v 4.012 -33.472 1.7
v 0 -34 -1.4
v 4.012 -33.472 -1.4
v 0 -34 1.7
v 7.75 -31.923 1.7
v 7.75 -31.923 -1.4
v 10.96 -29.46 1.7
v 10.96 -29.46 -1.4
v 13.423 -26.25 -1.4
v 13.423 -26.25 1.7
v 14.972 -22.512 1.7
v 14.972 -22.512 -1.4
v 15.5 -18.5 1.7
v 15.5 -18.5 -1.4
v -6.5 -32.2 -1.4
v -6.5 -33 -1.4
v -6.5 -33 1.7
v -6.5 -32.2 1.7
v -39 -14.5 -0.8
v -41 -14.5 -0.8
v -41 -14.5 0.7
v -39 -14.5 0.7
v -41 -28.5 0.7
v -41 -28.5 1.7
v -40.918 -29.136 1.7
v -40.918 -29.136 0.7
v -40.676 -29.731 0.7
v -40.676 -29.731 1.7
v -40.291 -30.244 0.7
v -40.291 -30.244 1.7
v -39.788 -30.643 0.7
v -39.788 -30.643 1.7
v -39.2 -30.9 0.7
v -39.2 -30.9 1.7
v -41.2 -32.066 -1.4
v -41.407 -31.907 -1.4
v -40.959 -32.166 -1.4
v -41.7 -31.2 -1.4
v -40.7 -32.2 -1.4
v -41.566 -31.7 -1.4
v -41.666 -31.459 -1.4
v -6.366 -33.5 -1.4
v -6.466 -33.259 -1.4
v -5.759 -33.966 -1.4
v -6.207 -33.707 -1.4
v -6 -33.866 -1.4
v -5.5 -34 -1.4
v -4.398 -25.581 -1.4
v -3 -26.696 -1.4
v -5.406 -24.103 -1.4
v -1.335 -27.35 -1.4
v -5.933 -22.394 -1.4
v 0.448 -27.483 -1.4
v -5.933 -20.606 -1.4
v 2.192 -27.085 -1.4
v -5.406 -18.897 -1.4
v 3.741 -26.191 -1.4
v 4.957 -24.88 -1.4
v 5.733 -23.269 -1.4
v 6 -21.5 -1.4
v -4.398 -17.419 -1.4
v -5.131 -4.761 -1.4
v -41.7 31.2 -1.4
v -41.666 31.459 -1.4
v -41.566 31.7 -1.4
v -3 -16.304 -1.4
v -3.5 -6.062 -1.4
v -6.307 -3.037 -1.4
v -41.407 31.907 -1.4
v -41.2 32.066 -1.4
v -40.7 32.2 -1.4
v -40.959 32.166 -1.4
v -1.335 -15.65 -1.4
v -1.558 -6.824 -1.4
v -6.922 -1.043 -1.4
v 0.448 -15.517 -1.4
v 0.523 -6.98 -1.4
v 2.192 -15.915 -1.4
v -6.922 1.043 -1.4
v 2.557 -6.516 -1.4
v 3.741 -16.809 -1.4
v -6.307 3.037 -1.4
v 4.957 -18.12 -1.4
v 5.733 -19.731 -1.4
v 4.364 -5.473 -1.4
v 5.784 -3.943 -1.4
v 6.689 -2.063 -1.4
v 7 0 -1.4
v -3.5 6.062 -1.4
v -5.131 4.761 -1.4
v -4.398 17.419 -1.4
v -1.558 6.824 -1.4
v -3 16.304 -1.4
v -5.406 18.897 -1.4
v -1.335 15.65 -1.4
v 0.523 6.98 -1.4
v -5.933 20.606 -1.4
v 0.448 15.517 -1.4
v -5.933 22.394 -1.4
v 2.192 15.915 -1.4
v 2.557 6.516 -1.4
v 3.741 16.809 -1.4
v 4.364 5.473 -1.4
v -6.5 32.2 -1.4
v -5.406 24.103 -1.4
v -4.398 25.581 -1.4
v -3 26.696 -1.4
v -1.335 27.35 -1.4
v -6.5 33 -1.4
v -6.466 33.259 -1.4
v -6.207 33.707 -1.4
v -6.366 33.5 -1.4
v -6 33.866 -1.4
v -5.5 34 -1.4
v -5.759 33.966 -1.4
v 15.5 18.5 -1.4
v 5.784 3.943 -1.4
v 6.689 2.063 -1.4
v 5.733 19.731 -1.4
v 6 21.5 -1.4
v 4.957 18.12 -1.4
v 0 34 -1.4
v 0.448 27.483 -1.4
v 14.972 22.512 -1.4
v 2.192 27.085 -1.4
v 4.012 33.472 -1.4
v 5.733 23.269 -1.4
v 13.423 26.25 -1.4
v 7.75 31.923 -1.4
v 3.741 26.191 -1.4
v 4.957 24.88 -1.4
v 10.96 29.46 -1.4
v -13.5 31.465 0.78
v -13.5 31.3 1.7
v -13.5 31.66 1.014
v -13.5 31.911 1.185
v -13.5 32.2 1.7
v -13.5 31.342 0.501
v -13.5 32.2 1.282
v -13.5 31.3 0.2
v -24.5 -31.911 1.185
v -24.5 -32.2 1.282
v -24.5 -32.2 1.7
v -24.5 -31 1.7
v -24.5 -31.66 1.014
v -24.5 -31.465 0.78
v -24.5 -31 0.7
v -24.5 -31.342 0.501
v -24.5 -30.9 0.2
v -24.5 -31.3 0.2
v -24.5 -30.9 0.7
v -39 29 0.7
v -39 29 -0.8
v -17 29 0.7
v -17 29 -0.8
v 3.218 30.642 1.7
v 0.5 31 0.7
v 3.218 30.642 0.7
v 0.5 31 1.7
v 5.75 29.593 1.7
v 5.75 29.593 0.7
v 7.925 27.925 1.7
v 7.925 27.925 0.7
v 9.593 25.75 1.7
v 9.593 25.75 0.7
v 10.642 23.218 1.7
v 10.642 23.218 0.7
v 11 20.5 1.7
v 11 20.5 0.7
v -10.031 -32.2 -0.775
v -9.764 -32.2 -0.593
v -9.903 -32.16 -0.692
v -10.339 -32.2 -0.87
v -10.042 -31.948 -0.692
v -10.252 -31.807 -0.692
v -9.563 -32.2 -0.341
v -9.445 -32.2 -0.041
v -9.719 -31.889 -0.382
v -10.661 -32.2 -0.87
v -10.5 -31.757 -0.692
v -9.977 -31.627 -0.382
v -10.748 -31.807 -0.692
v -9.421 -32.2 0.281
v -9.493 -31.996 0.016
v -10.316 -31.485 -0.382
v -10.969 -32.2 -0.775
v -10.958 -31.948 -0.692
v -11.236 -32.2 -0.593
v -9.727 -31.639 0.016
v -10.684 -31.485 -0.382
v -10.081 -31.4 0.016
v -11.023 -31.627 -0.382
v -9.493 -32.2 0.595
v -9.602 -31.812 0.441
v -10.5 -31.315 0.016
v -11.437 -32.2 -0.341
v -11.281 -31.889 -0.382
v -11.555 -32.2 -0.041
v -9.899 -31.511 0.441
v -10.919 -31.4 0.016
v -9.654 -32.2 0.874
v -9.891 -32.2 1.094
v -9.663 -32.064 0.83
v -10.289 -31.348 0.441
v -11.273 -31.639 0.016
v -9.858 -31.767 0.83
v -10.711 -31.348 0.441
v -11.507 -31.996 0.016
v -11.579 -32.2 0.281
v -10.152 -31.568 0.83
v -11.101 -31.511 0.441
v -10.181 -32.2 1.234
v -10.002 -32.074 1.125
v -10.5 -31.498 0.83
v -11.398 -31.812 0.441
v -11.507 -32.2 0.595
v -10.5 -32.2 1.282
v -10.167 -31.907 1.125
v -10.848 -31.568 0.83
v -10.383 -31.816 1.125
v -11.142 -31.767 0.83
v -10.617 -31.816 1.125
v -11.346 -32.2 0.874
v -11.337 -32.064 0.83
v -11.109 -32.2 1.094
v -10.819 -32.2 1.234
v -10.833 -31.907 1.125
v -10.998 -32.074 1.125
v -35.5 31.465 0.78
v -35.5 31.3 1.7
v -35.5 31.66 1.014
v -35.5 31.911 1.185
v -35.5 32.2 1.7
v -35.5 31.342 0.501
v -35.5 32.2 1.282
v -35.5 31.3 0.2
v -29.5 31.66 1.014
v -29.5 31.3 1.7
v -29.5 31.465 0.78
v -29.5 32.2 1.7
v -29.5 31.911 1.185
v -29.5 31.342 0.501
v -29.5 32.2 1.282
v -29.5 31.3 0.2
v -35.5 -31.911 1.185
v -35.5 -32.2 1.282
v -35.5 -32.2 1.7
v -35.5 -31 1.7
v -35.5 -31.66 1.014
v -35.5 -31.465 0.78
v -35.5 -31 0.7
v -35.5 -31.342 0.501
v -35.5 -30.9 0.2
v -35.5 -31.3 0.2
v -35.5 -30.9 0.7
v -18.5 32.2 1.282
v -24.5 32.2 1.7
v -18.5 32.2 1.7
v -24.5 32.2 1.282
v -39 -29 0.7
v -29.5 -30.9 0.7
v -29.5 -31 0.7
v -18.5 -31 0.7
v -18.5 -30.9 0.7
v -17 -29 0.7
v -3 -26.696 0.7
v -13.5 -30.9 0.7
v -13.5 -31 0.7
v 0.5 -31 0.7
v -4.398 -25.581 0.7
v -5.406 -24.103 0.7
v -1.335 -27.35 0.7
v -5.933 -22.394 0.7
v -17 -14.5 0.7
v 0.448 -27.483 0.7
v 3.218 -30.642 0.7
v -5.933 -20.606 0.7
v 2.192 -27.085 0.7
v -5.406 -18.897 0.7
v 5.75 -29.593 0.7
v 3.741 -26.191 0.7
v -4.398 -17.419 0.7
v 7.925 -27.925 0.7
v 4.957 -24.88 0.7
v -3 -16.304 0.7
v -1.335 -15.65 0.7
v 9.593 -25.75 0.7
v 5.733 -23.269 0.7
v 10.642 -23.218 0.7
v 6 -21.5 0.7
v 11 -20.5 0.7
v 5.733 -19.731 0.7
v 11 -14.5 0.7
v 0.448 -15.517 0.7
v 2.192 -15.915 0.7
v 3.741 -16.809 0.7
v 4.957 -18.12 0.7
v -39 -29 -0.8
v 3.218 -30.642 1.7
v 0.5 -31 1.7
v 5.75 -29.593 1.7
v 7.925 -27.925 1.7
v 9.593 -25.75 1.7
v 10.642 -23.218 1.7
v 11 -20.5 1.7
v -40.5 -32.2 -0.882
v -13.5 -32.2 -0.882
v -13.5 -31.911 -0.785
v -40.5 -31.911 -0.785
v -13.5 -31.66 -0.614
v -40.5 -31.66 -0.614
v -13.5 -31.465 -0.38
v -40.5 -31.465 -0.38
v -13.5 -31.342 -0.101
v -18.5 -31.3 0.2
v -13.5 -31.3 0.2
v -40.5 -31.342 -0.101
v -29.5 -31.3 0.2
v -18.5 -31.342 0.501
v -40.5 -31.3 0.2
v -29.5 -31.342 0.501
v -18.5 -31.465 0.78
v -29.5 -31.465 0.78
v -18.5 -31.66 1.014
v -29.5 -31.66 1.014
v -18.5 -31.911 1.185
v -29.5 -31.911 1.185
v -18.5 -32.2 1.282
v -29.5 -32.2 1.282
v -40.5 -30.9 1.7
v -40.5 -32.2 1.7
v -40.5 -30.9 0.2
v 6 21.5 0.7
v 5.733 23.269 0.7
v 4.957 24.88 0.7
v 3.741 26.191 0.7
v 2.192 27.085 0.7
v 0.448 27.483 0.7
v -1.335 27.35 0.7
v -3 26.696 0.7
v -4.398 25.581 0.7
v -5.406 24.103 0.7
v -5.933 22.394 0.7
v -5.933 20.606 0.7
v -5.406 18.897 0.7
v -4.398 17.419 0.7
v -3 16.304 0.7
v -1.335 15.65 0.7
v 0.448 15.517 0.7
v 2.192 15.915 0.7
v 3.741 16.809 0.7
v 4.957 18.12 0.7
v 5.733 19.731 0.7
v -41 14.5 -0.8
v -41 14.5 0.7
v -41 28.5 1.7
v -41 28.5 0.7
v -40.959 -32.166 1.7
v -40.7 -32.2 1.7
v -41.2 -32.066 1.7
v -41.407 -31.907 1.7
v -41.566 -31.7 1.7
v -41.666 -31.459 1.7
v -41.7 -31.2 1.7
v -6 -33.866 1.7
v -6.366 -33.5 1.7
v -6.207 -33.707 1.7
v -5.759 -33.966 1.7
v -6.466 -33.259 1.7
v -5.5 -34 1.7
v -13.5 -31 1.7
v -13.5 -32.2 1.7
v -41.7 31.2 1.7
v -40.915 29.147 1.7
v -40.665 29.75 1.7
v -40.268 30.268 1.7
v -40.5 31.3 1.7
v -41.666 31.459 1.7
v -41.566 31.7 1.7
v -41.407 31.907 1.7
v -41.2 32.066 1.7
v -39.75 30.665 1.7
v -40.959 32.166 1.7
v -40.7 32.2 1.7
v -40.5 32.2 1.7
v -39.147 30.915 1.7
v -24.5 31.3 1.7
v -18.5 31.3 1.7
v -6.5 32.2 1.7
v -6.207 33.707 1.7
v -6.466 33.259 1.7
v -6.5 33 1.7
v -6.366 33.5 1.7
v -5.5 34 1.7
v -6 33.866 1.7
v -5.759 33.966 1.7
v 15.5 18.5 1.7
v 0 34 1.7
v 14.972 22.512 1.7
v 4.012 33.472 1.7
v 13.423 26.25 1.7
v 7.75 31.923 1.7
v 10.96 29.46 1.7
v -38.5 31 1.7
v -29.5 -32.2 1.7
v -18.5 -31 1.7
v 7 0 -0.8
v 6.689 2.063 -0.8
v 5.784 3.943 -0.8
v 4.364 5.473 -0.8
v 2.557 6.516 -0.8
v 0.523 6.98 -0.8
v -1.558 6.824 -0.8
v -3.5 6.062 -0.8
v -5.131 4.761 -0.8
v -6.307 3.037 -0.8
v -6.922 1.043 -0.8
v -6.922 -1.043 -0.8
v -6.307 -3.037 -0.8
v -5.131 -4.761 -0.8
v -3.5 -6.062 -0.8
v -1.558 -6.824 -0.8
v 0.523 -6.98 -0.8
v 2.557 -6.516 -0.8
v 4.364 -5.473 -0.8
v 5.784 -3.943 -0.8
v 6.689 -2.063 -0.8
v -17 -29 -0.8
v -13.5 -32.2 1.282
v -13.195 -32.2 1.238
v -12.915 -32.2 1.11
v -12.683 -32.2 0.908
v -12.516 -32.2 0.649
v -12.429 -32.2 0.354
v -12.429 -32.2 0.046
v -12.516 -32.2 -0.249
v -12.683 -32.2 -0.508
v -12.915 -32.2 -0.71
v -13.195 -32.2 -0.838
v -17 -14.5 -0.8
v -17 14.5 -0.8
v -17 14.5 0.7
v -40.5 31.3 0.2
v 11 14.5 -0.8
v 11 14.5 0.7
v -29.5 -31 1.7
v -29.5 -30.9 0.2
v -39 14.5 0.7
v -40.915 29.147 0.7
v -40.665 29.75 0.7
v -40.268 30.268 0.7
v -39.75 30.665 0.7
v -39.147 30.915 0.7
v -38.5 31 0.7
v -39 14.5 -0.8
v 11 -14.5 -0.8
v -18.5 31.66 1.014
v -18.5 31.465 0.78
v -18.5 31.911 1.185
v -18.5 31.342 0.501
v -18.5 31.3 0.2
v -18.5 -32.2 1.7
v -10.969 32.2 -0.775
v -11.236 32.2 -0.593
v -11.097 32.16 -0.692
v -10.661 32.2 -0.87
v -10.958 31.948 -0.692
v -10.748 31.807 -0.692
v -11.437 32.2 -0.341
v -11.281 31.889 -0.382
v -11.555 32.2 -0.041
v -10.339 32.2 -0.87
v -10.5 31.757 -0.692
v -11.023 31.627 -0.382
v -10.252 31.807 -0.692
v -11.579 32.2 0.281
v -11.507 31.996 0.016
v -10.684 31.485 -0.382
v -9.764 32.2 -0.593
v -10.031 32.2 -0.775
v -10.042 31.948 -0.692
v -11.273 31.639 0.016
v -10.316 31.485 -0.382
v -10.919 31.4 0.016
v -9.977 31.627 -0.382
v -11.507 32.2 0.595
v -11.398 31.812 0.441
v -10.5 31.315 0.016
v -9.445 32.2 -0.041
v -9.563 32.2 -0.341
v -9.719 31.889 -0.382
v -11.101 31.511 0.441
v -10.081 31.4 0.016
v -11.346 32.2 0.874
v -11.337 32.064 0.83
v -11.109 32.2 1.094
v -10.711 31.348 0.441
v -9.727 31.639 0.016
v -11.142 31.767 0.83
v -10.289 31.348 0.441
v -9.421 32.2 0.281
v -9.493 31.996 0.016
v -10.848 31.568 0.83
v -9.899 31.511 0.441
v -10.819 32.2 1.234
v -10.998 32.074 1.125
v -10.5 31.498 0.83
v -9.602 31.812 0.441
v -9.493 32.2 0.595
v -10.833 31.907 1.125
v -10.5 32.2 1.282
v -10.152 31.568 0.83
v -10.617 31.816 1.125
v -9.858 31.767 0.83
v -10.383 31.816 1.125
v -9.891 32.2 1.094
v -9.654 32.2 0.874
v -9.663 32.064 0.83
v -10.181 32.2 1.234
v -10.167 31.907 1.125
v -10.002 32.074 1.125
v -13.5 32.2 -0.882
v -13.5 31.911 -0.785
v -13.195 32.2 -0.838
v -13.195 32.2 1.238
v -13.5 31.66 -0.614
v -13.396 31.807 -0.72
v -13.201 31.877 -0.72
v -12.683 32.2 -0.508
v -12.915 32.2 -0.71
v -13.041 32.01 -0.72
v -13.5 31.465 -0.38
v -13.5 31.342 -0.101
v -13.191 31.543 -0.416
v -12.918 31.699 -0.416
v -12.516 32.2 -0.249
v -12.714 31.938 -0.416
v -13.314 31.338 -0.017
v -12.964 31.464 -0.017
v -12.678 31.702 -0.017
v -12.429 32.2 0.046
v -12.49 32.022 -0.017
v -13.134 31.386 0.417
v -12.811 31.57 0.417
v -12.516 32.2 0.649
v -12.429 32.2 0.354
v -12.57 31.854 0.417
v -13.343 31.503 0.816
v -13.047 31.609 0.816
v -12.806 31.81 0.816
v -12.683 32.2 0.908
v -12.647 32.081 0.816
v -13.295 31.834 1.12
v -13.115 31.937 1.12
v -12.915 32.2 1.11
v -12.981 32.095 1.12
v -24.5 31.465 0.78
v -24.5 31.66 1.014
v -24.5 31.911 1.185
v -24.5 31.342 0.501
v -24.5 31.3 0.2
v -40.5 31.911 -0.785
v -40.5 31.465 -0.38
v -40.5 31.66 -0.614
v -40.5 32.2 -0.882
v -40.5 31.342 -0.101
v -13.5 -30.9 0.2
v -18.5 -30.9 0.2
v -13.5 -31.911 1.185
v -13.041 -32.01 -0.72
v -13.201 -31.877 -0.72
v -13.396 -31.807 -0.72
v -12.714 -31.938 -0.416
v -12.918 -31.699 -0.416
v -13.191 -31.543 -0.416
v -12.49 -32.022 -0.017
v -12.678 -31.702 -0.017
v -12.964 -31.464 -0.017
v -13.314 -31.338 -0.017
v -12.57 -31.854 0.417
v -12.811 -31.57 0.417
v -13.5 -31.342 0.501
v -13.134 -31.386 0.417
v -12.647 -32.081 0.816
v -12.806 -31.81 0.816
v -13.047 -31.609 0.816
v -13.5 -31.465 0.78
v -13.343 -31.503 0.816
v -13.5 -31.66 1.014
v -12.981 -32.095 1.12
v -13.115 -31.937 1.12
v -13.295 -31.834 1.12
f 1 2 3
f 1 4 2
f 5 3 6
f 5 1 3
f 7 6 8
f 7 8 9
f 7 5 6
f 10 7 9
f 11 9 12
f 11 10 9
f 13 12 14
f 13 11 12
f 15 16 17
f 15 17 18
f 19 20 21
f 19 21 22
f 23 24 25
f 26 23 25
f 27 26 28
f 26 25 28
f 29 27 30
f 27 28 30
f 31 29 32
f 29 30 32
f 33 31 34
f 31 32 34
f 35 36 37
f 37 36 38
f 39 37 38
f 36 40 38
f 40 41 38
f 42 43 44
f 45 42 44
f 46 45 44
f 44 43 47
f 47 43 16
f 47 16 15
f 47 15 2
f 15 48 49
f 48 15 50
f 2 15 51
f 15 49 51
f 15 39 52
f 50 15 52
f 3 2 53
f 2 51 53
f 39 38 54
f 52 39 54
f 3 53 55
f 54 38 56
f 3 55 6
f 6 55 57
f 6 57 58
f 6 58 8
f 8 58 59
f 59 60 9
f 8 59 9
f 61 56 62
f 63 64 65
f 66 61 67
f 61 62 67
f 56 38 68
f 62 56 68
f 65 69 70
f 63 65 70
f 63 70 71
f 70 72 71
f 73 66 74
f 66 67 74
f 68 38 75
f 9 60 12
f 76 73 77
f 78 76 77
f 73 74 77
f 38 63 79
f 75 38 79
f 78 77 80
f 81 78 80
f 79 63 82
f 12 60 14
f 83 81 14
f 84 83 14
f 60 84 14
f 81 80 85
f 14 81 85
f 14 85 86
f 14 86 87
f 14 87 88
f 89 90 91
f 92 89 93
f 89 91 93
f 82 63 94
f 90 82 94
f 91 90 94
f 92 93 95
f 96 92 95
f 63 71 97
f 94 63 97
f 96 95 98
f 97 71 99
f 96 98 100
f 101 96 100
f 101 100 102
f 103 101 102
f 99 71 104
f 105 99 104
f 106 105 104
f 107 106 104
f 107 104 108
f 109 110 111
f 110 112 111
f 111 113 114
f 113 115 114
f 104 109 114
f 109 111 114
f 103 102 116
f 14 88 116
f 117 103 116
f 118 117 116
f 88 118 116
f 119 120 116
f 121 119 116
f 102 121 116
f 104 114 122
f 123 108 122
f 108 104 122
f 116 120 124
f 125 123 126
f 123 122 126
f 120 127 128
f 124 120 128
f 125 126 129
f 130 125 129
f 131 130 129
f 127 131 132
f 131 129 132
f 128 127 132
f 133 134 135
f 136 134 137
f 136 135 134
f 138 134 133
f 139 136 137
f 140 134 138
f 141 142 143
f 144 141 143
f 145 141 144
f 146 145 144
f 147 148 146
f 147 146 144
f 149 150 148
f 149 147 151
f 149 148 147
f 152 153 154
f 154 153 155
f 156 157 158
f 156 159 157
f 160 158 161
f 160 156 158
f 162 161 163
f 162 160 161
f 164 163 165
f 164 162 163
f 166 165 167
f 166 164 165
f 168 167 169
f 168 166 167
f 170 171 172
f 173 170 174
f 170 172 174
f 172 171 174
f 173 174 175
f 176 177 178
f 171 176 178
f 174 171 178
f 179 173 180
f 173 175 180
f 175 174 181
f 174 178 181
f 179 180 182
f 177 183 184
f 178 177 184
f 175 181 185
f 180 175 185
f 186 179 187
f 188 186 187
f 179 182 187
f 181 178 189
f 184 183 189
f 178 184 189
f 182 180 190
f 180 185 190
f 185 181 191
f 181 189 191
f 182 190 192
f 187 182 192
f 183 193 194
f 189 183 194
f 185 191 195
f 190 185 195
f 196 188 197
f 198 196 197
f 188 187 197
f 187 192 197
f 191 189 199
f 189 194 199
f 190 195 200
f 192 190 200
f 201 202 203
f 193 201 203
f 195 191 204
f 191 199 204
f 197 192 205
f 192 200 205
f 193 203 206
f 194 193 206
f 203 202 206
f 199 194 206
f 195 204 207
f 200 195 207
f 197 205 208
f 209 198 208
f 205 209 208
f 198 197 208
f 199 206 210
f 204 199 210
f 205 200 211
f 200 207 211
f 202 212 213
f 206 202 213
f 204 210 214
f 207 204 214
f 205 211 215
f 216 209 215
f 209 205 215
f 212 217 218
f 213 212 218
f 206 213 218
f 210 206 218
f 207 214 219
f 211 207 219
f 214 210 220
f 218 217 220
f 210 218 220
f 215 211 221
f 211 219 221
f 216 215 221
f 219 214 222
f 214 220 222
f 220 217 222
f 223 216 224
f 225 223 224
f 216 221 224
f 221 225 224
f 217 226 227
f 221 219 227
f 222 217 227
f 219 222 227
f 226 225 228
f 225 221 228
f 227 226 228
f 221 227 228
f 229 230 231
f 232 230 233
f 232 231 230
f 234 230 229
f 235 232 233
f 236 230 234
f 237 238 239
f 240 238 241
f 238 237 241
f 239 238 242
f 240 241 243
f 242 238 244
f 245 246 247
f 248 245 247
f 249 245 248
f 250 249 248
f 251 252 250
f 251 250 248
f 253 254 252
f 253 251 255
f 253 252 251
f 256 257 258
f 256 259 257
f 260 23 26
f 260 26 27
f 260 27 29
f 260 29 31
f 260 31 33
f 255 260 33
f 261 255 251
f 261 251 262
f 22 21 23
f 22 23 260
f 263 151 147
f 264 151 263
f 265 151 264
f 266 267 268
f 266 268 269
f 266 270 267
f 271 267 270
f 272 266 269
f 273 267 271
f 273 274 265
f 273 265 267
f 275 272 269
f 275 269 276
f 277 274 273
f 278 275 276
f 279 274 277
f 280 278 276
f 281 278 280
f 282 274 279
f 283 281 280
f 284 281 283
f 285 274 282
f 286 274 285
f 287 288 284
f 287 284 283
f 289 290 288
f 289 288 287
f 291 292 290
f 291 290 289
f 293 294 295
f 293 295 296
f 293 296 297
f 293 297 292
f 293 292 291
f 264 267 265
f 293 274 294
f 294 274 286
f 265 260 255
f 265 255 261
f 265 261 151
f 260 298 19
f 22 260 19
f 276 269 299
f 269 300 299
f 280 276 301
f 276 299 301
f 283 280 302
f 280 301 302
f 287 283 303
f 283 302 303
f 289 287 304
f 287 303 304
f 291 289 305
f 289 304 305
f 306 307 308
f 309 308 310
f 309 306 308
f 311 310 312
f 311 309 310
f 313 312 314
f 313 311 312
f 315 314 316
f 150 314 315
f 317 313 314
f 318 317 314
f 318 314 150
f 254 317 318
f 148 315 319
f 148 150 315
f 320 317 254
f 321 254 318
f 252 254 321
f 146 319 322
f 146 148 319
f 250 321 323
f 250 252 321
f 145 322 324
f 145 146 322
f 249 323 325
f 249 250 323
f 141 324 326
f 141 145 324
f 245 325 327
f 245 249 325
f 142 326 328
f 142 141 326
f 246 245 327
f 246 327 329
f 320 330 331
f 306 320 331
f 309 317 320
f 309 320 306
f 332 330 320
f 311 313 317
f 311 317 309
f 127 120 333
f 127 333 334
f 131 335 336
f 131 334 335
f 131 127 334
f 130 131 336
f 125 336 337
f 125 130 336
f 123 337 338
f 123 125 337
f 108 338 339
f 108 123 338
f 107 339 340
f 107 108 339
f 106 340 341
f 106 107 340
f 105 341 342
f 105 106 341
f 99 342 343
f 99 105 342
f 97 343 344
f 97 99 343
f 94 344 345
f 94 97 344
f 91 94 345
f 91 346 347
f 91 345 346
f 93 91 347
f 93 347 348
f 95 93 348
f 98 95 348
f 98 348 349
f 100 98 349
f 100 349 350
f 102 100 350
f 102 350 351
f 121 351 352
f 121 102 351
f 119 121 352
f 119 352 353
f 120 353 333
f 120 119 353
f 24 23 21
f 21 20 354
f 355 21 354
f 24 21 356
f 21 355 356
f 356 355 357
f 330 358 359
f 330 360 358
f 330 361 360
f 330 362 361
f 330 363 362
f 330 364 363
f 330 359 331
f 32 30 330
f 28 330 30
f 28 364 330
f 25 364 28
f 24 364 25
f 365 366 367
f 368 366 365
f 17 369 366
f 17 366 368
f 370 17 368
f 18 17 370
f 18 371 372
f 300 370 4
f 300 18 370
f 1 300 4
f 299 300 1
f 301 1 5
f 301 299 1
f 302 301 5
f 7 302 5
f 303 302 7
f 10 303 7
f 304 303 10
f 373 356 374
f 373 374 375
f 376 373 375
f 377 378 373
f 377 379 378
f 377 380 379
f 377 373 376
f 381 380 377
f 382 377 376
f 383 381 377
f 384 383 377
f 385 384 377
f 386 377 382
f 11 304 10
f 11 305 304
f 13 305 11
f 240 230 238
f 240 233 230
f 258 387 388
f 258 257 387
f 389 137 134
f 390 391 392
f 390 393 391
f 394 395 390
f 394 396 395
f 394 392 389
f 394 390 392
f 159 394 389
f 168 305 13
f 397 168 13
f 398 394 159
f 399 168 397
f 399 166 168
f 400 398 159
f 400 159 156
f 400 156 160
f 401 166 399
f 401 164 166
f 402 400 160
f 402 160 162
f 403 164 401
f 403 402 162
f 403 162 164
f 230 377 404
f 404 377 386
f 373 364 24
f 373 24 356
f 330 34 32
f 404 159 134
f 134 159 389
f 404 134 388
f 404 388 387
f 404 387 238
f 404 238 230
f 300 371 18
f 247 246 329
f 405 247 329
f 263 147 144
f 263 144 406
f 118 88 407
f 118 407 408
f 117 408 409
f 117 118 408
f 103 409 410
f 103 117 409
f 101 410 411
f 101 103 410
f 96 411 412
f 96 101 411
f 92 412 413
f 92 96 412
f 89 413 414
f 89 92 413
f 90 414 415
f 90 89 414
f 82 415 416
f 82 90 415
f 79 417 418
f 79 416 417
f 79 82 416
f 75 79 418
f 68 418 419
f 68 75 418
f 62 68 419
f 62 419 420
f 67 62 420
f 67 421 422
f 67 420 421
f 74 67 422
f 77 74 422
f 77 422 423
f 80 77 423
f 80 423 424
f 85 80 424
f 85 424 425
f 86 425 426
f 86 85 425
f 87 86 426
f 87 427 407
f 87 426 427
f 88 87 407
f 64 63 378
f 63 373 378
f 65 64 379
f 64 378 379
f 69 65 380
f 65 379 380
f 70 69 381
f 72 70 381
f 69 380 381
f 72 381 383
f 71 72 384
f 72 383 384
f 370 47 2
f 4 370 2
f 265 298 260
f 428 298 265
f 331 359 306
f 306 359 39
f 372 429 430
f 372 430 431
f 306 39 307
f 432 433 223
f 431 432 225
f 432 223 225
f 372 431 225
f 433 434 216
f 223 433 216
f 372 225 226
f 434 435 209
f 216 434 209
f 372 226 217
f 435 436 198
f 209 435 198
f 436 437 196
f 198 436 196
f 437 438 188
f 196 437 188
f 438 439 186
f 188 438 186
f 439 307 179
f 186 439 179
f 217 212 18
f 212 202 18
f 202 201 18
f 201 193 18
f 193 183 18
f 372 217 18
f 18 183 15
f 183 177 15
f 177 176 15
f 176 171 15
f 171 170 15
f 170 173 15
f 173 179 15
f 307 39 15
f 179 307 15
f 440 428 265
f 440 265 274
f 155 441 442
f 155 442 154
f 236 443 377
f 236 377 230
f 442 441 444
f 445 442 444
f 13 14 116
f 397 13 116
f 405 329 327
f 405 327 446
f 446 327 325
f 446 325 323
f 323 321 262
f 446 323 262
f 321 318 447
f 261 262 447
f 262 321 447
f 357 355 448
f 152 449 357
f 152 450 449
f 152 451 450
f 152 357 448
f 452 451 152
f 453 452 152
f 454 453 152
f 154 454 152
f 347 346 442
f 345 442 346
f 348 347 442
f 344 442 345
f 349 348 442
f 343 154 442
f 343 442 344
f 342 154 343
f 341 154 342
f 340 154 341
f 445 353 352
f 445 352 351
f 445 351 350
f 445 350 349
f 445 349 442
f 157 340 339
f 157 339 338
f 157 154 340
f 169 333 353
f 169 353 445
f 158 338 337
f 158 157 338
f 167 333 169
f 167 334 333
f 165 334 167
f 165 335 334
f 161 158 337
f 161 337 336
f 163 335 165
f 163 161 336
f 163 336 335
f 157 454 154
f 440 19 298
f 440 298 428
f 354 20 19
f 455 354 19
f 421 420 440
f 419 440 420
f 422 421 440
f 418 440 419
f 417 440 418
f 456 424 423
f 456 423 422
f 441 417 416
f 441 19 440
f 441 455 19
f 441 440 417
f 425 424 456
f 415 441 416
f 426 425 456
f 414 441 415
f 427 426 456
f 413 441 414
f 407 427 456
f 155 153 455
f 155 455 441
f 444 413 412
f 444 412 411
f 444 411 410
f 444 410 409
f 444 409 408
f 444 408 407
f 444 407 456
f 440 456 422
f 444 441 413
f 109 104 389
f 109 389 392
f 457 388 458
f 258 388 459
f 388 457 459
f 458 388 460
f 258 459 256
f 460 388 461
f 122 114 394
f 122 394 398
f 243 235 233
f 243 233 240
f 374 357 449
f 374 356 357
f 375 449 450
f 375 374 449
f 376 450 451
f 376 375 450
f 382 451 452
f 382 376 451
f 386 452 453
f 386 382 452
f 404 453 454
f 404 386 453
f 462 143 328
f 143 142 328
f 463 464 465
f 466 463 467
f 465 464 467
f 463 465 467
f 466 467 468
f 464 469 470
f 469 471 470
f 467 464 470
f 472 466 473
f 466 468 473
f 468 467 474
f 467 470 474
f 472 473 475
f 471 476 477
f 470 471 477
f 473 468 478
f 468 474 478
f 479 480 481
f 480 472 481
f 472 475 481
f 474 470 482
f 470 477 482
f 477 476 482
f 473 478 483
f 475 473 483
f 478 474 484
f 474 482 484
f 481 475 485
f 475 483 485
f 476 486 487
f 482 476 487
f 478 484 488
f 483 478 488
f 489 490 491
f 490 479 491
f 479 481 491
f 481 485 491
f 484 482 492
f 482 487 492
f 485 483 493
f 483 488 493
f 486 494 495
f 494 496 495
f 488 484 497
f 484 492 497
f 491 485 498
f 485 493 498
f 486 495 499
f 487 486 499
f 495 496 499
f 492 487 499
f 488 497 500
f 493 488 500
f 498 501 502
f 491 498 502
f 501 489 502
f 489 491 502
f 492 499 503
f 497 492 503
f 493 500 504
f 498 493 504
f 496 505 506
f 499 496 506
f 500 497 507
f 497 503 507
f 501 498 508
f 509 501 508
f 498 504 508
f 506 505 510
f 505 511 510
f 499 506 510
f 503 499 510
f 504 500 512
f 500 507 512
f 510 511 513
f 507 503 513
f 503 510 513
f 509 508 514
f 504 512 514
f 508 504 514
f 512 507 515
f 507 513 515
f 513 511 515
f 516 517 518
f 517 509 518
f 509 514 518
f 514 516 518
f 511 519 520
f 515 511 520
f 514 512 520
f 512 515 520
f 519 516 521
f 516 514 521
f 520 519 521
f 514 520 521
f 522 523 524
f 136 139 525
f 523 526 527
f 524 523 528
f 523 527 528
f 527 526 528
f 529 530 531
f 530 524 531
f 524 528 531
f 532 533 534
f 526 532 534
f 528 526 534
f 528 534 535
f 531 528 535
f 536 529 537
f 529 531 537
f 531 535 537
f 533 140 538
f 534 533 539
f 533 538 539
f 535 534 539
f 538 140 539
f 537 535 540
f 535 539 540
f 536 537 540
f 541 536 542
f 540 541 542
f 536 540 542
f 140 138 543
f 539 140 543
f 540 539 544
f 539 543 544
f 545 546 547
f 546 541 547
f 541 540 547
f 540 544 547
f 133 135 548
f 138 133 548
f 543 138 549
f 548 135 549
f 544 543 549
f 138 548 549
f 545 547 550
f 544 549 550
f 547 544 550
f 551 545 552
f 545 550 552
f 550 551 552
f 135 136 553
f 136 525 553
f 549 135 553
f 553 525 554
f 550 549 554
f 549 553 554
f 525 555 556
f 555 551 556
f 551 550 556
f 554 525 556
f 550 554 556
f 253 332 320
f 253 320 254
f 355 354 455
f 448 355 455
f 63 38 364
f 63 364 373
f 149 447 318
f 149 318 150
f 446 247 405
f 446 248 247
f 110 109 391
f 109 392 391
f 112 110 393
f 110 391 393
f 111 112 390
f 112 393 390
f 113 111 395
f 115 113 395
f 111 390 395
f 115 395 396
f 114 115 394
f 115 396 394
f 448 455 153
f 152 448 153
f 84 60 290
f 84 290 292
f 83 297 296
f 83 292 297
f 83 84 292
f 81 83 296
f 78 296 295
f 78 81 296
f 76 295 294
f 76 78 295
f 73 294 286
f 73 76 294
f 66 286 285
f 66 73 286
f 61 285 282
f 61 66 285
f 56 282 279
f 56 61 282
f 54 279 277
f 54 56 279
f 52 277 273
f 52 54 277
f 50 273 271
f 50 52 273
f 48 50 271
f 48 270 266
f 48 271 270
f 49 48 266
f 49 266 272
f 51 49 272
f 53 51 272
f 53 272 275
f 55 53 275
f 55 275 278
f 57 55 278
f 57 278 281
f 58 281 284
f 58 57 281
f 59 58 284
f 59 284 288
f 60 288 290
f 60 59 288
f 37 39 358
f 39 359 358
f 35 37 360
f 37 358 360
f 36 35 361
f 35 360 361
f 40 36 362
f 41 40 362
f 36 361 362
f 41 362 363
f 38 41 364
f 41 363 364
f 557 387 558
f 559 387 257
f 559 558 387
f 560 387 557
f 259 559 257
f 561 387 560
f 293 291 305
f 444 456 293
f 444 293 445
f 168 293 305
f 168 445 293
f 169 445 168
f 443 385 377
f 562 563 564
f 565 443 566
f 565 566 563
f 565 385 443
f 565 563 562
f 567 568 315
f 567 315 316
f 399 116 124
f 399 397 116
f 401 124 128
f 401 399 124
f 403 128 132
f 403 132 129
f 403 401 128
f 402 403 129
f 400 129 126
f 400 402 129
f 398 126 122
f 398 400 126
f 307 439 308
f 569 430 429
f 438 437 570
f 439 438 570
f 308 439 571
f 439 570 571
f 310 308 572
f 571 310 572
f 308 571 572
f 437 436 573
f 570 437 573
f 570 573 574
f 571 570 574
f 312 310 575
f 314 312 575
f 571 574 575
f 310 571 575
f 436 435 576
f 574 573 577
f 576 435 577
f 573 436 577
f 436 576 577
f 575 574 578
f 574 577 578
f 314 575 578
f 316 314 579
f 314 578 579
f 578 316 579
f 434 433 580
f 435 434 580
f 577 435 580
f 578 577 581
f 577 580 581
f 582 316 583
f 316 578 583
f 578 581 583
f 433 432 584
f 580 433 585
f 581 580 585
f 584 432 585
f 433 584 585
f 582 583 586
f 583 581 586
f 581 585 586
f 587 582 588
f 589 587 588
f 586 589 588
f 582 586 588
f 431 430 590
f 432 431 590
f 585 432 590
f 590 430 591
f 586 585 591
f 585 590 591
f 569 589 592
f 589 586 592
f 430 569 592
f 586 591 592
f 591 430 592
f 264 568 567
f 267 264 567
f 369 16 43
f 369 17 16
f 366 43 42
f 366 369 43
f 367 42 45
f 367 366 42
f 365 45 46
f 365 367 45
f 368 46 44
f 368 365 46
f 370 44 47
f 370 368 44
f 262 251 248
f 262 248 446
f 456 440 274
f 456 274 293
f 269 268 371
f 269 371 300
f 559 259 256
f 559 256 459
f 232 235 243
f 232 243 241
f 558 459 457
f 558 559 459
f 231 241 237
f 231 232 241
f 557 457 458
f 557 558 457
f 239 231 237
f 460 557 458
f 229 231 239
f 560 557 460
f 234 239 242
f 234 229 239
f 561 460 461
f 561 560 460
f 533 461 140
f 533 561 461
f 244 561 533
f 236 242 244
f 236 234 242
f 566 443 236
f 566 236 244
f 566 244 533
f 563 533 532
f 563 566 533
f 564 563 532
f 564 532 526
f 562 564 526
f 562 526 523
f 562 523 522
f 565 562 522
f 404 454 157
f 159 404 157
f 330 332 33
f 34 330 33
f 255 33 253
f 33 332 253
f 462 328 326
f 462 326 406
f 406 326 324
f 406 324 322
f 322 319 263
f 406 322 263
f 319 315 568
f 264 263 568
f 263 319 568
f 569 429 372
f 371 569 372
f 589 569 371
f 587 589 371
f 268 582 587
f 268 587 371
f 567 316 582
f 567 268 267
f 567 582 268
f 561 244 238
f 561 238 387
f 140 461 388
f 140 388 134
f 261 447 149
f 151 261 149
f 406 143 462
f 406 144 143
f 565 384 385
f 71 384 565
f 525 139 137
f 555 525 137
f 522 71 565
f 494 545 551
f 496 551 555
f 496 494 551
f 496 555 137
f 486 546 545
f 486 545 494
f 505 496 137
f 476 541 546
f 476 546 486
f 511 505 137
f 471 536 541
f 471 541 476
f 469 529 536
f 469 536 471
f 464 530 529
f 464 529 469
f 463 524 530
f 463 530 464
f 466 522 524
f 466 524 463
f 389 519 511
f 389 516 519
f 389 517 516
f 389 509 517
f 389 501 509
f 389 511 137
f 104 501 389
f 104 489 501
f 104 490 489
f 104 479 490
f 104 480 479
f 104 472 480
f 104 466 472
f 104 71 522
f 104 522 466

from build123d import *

# Parameters (mm, degrees)
CYLINDER_R        = 1.1
CYLINDER_DEPTH    = 27
ARRAY018_Y_COUNT  = 2
ARRAY018_Y_PITCH  = 64.8
BOX_W             = 5
BOX_H             = 2.6
BOX_DEPTH         = 10
ARRAY019_X_COUNT  = 3
ARRAY019_X_PITCH  = 11
ARRAY019_Y_COUNT  = 2
ARRAY019_Y_PITCH  = 64.8
ARRAY017_X_COUNT  = 2
ARRAY017_X_PITCH  = 3
ARRAY017_Y_COUNT  = 2
ARRAY017_Y_PITCH  = 64.8
BOX030_W          = 1.8
BOX030_H          = 68
BOX030_DEPTH      = 10
BOX029_W          = 37
BOX029_H          = 1.8
BOX029_DEPTH      = 10
ARRAY016_Y_COUNT  = 2
ARRAY016_Y_PITCH  = 66.2
CYLINDER021_R     = 6
CYLINDER021_DEPTH = 10
CYLINDER022_R     = 7
CYLINDER022_DEPTH = 10
CYLINDER020_R     = 6
CYLINDER020_DEPTH = 10
BOX028_W          = 22
BOX028_H          = 58
BOX028_DEPTH      = 1.5
BOX027_W          = 52
BOX027_H          = 29
BOX027_DEPTH      = 1.5
BOX026_W          = 52
BOX026_H          = 62
BOX026_DEPTH      = 1
FILLET018_R       = 2.5
FILLET019_R       = 10.5
CYLINDER019_W     = 15.5
CYLINDER019_H     = 3.1
CYLINDER019_ANGLE = 90
BOX024_W          = 15.5
BOX024_H          = 37
BOX024_DEPTH      = 3.1
BOX025_W          = 43.5
BOX025_H          = 68
BOX025_DEPTH      = 3.1
FILLET017_R       = 2
CYLINDER018_W     = 15.5
CYLINDER018_H     = 3.1
CYLINDER018_ANGLE = 90
FILLET020_R       = 1


with BuildPart() as array018:
    # Cylinder → Cylinder (new body)
    with BuildSketch(Plane(origin=(-40.5, -32.4, 0.2), x_dir=(0, 0, -1), z_dir=(1, 0, 0))):
        Circle(CYLINDER_R)
    extrude(amount=CYLINDER_DEPTH)

    # Array018 Y: Array018 ×2


with BuildPart() as array018_1:
    add(array018.part)
    with Locations(*[(0, i * ARRAY018_Y_PITCH, 0) for i in range(1, ARRAY018_Y_COUNT)]):
        add(array018.part)


with BuildPart() as array019:
    # Box → Box (new body)
    with BuildSketch(Plane(origin=(-18.5, -33.5, 0.2), x_dir=(1, 0, 0), z_dir=(0, 0, 1))):
        with Locations((2.5, 1.3)):
            Rectangle(BOX_W, BOX_H)
    extrude(amount=BOX_DEPTH)

    # Array019 X: Array019 ×3


with BuildPart() as array019_1:
    add(array019.part)
    with Locations(*[(-i * ARRAY019_X_PITCH, 0, 0) for i in range(1, ARRAY019_X_COUNT)]):
        add(array019.part)

    # Array019 Y: Array019 ×2


with BuildPart() as array019_2:
    add(array019_1.part)
    with Locations(*[(0, i * ARRAY019_Y_PITCH, 0) for i in range(1, ARRAY019_Y_COUNT)]):
        add(array019_1.part)


with BuildPart() as nutall:
    # Sphere001 → Sphere001 (revolve)
    with BuildSketch(Plane(origin=(-10.5, -32.4, 0.2), x_dir=(1, 0, 0), z_dir=(0, -1, 0))):
        with BuildLine():
            ThreePointArc((0, -1.1), (1.1, 0), (0, 1.1))
            Line((0, 1.1), (0, -1.1))
        make_face()
    revolve(axis=Axis((-10.5, -32.4, 0.2), (0, 0, 1)))

    # Array017 X: NutAll ×2


with BuildPart() as nutall_1:
    add(nutall.part)
    with Locations(*[(-i * ARRAY017_X_PITCH, 0, 0) for i in range(1, ARRAY017_X_COUNT)]):
        add(nutall.part)

    # Array017 Y: NutAll ×2


with BuildPart() as nutall_2:
    add(nutall_1.part)
    with Locations(*[(0, i * ARRAY017_Y_PITCH, 0) for i in range(1, ARRAY017_Y_COUNT)]):
        add(nutall_1.part)

    # Fusion013: union Array018, Array019
    add(array018_1.part)
    add(array019_2.part)


with BuildPart() as dbcut2:
    # Box030 → Box030 (new body)
    with BuildSketch(Plane(origin=(-43.5, -34, -1.4), x_dir=(1, 0, 0), z_dir=(0, 0, 1))):
        with Locations((0.9, 34)):
            Rectangle(BOX030_W, BOX030_H)
    extrude(amount=BOX030_DEPTH)


with BuildPart() as deckelrandcut:
    # Box029 → Box029 (new body)
    with BuildSketch(Plane(origin=(-43.5, -34, -1.4), x_dir=(1, 0, 0), z_dir=(0, 0, 1))):
        with Locations((18.5, 0.9)):
            Rectangle(BOX029_W, BOX029_H)
    extrude(amount=BOX029_DEPTH)

    # Array016 Y: DeckelRandCut ×2


with BuildPart() as deckelrandcut_1:
    add(deckelrandcut.part)
    with Locations(*[(0, i * ARRAY016_Y_PITCH, 0) for i in range(1, ARRAY016_Y_COUNT)]):
        add(deckelrandcut.part)

    # Fusion012: union DBCut2
    add(dbcut2.part)


with BuildPart() as locho:
    # Cylinder021 → Cylinder021 (new body)
    with BuildSketch(Plane(origin=(0, 21.5, -3), x_dir=(1, 0, 0), z_dir=(0, 0, 1))):
        Circle(CYLINDER021_R)
    extrude(amount=CYLINDER021_DEPTH)


with BuildPart() as lochm:
    # Cylinder022 → Cylinder022 (new body)
    with BuildSketch(Plane.XY.offset(-3)):
        Circle(CYLINDER022_R)
    extrude(amount=CYLINDER022_DEPTH)


with BuildPart() as lochomu:
    # Cylinder020 → Cylinder020 (new body)
    with BuildSketch(Plane(origin=(0, -21.5, -3), x_dir=(1, 0, 0), z_dir=(0, 0, 1))):
        Circle(CYLINDER020_R)
    extrude(amount=CYLINDER020_DEPTH)

    # Fusion009: union LochO, LochM
    add(locho.part)
    add(lochm.part)


with BuildPart() as partcut2:
    # Box028 → Box028 (new body)
    with BuildSketch(Plane(origin=(-39, -29, -0.8), x_dir=(1, 0, 0), z_dir=(0, 0, 1))):
        with Locations((11, 29)):
            Rectangle(BOX028_W, BOX028_H)
    extrude(amount=BOX028_DEPTH)


with BuildPart() as partcuts:
    # Box027 → Box027 (new body)
    with BuildSketch(Plane(origin=(-41, -14.5, -0.8), x_dir=(1, 0, 0), z_dir=(0, 0, 1))):
        with Locations((26, 14.5)):
            Rectangle(BOX027_W, BOX027_H)
    extrude(amount=BOX027_DEPTH)

    # Fusion008: union PartCut2
    add(partcut2.part)


with BuildPart() as fillet019:
    # Box026 → Box026 (new body)
    with BuildSketch(Plane(origin=(-41, -31, 0.7), x_dir=(1, 0, 0), z_dir=(0, 0, 1))):
        with Locations((26, 31)):
            Rectangle(BOX026_W, BOX026_H)
    extrude(amount=BOX026_DEPTH)

    # Fillet018
    fillet018_edges = [fillet019.edges().sort_by_distance(p)[0] for p in [
        (-41, -31, 1.2),
        (-41, 31, 1.2),
    ]]
    fillet(fillet018_edges, radius=FILLET018_R)

    # Fillet019
    fillet019_edges = [fillet019.edges().sort_by_distance(p)[0] for p in [
        (11, -31, 1.2),
        (11, 31, 1.2),
    ]]
    fillet(fillet019_edges, radius=FILLET019_R)


with BuildPart() as eru:
    # Cylinder019 → Cylinder019 (revolve)
    with BuildSketch(Plane(origin=(0, -18.5, -1.4), x_dir=(0, -1, 0), z_dir=(-1, 0, 0))):
        with Locations((7.75, 1.55)):
            Rectangle(CYLINDER019_W, CYLINDER019_H)
    revolve(axis=Axis((0, -18.5, -1.4), (0, 0, 1)), revolution_arc=CYLINDER019_ANGLE)


with BuildPart() as mr:
    # Box024 → Box024 (new body)
    with BuildSketch(Plane(origin=(0, -18.5, -1.4), x_dir=(1, 0, 0), z_dir=(0, 0, 1))):
        with Locations((7.75, 18.5)):
            Rectangle(BOX024_W, BOX024_H)
    extrude(amount=BOX024_DEPTH)


with BuildPart() as fillet017:
    # Box025 → Box025 (new body)
    with BuildSketch(Plane(origin=(-43.5, -34, -1.4), x_dir=(1, 0, 0), z_dir=(0, 0, 1))):
        with Locations((21.75, 34)):
            Rectangle(BOX025_W, BOX025_H)
    extrude(amount=BOX025_DEPTH)

    # Fillet017
    fillet017_edges = [fillet017.edges().sort_by_distance(p)[0] for p in [
        (-43.5, -34, 0.15),
        (-43.5, 34, 0.15),
    ]]
    fillet(fillet017_edges, radius=FILLET017_R)


with BuildPart() as bodenr:
    # Cylinder018 → Cylinder018 (revolve)
    with BuildSketch(Plane(origin=(0, 18.5, -1.4), x_dir=(1, 0, 0), z_dir=(0, -1, 0))):
        with Locations((7.75, 1.55)):
            Rectangle(CYLINDER018_W, CYLINDER018_H)
    revolve(axis=Axis((0, 18.5, -1.4), (0, 0, 1)), revolution_arc=CYLINDER018_ANGLE)

    # Fusion007: union ERU, MR, Fillet017
    add(eru.part)
    add(mr.part)
    add(fillet017.part)

    # Cut030: cut Fillet019
    add(fillet019.part, mode=Mode.SUBTRACT)

    # Cut031: cut PartCuts
    add(partcuts.part, mode=Mode.SUBTRACT)

    # Cut032: cut LochOMU
    add(lochomu.part, mode=Mode.SUBTRACT)

    # Cut033: cut DeckelRandCut
    add(deckelrandcut_1.part, mode=Mode.SUBTRACT)

    # Fillet020
    fillet020_edges = [bodenr.edges().sort_by_distance(p)[0] for p in [
        (-6.5, 34, 0.15),
        (-6.5, -34, 0.15),
        (-41.7, -32.2, 0.15),
        (-41.7, 32.2, 0.15),
    ]]
    fillet(fillet020_edges, radius=FILLET020_R)

    # Cut: cut NutAll
    add(nutall_2.part, mode=Mode.SUBTRACT)


solid = bodenr.part
